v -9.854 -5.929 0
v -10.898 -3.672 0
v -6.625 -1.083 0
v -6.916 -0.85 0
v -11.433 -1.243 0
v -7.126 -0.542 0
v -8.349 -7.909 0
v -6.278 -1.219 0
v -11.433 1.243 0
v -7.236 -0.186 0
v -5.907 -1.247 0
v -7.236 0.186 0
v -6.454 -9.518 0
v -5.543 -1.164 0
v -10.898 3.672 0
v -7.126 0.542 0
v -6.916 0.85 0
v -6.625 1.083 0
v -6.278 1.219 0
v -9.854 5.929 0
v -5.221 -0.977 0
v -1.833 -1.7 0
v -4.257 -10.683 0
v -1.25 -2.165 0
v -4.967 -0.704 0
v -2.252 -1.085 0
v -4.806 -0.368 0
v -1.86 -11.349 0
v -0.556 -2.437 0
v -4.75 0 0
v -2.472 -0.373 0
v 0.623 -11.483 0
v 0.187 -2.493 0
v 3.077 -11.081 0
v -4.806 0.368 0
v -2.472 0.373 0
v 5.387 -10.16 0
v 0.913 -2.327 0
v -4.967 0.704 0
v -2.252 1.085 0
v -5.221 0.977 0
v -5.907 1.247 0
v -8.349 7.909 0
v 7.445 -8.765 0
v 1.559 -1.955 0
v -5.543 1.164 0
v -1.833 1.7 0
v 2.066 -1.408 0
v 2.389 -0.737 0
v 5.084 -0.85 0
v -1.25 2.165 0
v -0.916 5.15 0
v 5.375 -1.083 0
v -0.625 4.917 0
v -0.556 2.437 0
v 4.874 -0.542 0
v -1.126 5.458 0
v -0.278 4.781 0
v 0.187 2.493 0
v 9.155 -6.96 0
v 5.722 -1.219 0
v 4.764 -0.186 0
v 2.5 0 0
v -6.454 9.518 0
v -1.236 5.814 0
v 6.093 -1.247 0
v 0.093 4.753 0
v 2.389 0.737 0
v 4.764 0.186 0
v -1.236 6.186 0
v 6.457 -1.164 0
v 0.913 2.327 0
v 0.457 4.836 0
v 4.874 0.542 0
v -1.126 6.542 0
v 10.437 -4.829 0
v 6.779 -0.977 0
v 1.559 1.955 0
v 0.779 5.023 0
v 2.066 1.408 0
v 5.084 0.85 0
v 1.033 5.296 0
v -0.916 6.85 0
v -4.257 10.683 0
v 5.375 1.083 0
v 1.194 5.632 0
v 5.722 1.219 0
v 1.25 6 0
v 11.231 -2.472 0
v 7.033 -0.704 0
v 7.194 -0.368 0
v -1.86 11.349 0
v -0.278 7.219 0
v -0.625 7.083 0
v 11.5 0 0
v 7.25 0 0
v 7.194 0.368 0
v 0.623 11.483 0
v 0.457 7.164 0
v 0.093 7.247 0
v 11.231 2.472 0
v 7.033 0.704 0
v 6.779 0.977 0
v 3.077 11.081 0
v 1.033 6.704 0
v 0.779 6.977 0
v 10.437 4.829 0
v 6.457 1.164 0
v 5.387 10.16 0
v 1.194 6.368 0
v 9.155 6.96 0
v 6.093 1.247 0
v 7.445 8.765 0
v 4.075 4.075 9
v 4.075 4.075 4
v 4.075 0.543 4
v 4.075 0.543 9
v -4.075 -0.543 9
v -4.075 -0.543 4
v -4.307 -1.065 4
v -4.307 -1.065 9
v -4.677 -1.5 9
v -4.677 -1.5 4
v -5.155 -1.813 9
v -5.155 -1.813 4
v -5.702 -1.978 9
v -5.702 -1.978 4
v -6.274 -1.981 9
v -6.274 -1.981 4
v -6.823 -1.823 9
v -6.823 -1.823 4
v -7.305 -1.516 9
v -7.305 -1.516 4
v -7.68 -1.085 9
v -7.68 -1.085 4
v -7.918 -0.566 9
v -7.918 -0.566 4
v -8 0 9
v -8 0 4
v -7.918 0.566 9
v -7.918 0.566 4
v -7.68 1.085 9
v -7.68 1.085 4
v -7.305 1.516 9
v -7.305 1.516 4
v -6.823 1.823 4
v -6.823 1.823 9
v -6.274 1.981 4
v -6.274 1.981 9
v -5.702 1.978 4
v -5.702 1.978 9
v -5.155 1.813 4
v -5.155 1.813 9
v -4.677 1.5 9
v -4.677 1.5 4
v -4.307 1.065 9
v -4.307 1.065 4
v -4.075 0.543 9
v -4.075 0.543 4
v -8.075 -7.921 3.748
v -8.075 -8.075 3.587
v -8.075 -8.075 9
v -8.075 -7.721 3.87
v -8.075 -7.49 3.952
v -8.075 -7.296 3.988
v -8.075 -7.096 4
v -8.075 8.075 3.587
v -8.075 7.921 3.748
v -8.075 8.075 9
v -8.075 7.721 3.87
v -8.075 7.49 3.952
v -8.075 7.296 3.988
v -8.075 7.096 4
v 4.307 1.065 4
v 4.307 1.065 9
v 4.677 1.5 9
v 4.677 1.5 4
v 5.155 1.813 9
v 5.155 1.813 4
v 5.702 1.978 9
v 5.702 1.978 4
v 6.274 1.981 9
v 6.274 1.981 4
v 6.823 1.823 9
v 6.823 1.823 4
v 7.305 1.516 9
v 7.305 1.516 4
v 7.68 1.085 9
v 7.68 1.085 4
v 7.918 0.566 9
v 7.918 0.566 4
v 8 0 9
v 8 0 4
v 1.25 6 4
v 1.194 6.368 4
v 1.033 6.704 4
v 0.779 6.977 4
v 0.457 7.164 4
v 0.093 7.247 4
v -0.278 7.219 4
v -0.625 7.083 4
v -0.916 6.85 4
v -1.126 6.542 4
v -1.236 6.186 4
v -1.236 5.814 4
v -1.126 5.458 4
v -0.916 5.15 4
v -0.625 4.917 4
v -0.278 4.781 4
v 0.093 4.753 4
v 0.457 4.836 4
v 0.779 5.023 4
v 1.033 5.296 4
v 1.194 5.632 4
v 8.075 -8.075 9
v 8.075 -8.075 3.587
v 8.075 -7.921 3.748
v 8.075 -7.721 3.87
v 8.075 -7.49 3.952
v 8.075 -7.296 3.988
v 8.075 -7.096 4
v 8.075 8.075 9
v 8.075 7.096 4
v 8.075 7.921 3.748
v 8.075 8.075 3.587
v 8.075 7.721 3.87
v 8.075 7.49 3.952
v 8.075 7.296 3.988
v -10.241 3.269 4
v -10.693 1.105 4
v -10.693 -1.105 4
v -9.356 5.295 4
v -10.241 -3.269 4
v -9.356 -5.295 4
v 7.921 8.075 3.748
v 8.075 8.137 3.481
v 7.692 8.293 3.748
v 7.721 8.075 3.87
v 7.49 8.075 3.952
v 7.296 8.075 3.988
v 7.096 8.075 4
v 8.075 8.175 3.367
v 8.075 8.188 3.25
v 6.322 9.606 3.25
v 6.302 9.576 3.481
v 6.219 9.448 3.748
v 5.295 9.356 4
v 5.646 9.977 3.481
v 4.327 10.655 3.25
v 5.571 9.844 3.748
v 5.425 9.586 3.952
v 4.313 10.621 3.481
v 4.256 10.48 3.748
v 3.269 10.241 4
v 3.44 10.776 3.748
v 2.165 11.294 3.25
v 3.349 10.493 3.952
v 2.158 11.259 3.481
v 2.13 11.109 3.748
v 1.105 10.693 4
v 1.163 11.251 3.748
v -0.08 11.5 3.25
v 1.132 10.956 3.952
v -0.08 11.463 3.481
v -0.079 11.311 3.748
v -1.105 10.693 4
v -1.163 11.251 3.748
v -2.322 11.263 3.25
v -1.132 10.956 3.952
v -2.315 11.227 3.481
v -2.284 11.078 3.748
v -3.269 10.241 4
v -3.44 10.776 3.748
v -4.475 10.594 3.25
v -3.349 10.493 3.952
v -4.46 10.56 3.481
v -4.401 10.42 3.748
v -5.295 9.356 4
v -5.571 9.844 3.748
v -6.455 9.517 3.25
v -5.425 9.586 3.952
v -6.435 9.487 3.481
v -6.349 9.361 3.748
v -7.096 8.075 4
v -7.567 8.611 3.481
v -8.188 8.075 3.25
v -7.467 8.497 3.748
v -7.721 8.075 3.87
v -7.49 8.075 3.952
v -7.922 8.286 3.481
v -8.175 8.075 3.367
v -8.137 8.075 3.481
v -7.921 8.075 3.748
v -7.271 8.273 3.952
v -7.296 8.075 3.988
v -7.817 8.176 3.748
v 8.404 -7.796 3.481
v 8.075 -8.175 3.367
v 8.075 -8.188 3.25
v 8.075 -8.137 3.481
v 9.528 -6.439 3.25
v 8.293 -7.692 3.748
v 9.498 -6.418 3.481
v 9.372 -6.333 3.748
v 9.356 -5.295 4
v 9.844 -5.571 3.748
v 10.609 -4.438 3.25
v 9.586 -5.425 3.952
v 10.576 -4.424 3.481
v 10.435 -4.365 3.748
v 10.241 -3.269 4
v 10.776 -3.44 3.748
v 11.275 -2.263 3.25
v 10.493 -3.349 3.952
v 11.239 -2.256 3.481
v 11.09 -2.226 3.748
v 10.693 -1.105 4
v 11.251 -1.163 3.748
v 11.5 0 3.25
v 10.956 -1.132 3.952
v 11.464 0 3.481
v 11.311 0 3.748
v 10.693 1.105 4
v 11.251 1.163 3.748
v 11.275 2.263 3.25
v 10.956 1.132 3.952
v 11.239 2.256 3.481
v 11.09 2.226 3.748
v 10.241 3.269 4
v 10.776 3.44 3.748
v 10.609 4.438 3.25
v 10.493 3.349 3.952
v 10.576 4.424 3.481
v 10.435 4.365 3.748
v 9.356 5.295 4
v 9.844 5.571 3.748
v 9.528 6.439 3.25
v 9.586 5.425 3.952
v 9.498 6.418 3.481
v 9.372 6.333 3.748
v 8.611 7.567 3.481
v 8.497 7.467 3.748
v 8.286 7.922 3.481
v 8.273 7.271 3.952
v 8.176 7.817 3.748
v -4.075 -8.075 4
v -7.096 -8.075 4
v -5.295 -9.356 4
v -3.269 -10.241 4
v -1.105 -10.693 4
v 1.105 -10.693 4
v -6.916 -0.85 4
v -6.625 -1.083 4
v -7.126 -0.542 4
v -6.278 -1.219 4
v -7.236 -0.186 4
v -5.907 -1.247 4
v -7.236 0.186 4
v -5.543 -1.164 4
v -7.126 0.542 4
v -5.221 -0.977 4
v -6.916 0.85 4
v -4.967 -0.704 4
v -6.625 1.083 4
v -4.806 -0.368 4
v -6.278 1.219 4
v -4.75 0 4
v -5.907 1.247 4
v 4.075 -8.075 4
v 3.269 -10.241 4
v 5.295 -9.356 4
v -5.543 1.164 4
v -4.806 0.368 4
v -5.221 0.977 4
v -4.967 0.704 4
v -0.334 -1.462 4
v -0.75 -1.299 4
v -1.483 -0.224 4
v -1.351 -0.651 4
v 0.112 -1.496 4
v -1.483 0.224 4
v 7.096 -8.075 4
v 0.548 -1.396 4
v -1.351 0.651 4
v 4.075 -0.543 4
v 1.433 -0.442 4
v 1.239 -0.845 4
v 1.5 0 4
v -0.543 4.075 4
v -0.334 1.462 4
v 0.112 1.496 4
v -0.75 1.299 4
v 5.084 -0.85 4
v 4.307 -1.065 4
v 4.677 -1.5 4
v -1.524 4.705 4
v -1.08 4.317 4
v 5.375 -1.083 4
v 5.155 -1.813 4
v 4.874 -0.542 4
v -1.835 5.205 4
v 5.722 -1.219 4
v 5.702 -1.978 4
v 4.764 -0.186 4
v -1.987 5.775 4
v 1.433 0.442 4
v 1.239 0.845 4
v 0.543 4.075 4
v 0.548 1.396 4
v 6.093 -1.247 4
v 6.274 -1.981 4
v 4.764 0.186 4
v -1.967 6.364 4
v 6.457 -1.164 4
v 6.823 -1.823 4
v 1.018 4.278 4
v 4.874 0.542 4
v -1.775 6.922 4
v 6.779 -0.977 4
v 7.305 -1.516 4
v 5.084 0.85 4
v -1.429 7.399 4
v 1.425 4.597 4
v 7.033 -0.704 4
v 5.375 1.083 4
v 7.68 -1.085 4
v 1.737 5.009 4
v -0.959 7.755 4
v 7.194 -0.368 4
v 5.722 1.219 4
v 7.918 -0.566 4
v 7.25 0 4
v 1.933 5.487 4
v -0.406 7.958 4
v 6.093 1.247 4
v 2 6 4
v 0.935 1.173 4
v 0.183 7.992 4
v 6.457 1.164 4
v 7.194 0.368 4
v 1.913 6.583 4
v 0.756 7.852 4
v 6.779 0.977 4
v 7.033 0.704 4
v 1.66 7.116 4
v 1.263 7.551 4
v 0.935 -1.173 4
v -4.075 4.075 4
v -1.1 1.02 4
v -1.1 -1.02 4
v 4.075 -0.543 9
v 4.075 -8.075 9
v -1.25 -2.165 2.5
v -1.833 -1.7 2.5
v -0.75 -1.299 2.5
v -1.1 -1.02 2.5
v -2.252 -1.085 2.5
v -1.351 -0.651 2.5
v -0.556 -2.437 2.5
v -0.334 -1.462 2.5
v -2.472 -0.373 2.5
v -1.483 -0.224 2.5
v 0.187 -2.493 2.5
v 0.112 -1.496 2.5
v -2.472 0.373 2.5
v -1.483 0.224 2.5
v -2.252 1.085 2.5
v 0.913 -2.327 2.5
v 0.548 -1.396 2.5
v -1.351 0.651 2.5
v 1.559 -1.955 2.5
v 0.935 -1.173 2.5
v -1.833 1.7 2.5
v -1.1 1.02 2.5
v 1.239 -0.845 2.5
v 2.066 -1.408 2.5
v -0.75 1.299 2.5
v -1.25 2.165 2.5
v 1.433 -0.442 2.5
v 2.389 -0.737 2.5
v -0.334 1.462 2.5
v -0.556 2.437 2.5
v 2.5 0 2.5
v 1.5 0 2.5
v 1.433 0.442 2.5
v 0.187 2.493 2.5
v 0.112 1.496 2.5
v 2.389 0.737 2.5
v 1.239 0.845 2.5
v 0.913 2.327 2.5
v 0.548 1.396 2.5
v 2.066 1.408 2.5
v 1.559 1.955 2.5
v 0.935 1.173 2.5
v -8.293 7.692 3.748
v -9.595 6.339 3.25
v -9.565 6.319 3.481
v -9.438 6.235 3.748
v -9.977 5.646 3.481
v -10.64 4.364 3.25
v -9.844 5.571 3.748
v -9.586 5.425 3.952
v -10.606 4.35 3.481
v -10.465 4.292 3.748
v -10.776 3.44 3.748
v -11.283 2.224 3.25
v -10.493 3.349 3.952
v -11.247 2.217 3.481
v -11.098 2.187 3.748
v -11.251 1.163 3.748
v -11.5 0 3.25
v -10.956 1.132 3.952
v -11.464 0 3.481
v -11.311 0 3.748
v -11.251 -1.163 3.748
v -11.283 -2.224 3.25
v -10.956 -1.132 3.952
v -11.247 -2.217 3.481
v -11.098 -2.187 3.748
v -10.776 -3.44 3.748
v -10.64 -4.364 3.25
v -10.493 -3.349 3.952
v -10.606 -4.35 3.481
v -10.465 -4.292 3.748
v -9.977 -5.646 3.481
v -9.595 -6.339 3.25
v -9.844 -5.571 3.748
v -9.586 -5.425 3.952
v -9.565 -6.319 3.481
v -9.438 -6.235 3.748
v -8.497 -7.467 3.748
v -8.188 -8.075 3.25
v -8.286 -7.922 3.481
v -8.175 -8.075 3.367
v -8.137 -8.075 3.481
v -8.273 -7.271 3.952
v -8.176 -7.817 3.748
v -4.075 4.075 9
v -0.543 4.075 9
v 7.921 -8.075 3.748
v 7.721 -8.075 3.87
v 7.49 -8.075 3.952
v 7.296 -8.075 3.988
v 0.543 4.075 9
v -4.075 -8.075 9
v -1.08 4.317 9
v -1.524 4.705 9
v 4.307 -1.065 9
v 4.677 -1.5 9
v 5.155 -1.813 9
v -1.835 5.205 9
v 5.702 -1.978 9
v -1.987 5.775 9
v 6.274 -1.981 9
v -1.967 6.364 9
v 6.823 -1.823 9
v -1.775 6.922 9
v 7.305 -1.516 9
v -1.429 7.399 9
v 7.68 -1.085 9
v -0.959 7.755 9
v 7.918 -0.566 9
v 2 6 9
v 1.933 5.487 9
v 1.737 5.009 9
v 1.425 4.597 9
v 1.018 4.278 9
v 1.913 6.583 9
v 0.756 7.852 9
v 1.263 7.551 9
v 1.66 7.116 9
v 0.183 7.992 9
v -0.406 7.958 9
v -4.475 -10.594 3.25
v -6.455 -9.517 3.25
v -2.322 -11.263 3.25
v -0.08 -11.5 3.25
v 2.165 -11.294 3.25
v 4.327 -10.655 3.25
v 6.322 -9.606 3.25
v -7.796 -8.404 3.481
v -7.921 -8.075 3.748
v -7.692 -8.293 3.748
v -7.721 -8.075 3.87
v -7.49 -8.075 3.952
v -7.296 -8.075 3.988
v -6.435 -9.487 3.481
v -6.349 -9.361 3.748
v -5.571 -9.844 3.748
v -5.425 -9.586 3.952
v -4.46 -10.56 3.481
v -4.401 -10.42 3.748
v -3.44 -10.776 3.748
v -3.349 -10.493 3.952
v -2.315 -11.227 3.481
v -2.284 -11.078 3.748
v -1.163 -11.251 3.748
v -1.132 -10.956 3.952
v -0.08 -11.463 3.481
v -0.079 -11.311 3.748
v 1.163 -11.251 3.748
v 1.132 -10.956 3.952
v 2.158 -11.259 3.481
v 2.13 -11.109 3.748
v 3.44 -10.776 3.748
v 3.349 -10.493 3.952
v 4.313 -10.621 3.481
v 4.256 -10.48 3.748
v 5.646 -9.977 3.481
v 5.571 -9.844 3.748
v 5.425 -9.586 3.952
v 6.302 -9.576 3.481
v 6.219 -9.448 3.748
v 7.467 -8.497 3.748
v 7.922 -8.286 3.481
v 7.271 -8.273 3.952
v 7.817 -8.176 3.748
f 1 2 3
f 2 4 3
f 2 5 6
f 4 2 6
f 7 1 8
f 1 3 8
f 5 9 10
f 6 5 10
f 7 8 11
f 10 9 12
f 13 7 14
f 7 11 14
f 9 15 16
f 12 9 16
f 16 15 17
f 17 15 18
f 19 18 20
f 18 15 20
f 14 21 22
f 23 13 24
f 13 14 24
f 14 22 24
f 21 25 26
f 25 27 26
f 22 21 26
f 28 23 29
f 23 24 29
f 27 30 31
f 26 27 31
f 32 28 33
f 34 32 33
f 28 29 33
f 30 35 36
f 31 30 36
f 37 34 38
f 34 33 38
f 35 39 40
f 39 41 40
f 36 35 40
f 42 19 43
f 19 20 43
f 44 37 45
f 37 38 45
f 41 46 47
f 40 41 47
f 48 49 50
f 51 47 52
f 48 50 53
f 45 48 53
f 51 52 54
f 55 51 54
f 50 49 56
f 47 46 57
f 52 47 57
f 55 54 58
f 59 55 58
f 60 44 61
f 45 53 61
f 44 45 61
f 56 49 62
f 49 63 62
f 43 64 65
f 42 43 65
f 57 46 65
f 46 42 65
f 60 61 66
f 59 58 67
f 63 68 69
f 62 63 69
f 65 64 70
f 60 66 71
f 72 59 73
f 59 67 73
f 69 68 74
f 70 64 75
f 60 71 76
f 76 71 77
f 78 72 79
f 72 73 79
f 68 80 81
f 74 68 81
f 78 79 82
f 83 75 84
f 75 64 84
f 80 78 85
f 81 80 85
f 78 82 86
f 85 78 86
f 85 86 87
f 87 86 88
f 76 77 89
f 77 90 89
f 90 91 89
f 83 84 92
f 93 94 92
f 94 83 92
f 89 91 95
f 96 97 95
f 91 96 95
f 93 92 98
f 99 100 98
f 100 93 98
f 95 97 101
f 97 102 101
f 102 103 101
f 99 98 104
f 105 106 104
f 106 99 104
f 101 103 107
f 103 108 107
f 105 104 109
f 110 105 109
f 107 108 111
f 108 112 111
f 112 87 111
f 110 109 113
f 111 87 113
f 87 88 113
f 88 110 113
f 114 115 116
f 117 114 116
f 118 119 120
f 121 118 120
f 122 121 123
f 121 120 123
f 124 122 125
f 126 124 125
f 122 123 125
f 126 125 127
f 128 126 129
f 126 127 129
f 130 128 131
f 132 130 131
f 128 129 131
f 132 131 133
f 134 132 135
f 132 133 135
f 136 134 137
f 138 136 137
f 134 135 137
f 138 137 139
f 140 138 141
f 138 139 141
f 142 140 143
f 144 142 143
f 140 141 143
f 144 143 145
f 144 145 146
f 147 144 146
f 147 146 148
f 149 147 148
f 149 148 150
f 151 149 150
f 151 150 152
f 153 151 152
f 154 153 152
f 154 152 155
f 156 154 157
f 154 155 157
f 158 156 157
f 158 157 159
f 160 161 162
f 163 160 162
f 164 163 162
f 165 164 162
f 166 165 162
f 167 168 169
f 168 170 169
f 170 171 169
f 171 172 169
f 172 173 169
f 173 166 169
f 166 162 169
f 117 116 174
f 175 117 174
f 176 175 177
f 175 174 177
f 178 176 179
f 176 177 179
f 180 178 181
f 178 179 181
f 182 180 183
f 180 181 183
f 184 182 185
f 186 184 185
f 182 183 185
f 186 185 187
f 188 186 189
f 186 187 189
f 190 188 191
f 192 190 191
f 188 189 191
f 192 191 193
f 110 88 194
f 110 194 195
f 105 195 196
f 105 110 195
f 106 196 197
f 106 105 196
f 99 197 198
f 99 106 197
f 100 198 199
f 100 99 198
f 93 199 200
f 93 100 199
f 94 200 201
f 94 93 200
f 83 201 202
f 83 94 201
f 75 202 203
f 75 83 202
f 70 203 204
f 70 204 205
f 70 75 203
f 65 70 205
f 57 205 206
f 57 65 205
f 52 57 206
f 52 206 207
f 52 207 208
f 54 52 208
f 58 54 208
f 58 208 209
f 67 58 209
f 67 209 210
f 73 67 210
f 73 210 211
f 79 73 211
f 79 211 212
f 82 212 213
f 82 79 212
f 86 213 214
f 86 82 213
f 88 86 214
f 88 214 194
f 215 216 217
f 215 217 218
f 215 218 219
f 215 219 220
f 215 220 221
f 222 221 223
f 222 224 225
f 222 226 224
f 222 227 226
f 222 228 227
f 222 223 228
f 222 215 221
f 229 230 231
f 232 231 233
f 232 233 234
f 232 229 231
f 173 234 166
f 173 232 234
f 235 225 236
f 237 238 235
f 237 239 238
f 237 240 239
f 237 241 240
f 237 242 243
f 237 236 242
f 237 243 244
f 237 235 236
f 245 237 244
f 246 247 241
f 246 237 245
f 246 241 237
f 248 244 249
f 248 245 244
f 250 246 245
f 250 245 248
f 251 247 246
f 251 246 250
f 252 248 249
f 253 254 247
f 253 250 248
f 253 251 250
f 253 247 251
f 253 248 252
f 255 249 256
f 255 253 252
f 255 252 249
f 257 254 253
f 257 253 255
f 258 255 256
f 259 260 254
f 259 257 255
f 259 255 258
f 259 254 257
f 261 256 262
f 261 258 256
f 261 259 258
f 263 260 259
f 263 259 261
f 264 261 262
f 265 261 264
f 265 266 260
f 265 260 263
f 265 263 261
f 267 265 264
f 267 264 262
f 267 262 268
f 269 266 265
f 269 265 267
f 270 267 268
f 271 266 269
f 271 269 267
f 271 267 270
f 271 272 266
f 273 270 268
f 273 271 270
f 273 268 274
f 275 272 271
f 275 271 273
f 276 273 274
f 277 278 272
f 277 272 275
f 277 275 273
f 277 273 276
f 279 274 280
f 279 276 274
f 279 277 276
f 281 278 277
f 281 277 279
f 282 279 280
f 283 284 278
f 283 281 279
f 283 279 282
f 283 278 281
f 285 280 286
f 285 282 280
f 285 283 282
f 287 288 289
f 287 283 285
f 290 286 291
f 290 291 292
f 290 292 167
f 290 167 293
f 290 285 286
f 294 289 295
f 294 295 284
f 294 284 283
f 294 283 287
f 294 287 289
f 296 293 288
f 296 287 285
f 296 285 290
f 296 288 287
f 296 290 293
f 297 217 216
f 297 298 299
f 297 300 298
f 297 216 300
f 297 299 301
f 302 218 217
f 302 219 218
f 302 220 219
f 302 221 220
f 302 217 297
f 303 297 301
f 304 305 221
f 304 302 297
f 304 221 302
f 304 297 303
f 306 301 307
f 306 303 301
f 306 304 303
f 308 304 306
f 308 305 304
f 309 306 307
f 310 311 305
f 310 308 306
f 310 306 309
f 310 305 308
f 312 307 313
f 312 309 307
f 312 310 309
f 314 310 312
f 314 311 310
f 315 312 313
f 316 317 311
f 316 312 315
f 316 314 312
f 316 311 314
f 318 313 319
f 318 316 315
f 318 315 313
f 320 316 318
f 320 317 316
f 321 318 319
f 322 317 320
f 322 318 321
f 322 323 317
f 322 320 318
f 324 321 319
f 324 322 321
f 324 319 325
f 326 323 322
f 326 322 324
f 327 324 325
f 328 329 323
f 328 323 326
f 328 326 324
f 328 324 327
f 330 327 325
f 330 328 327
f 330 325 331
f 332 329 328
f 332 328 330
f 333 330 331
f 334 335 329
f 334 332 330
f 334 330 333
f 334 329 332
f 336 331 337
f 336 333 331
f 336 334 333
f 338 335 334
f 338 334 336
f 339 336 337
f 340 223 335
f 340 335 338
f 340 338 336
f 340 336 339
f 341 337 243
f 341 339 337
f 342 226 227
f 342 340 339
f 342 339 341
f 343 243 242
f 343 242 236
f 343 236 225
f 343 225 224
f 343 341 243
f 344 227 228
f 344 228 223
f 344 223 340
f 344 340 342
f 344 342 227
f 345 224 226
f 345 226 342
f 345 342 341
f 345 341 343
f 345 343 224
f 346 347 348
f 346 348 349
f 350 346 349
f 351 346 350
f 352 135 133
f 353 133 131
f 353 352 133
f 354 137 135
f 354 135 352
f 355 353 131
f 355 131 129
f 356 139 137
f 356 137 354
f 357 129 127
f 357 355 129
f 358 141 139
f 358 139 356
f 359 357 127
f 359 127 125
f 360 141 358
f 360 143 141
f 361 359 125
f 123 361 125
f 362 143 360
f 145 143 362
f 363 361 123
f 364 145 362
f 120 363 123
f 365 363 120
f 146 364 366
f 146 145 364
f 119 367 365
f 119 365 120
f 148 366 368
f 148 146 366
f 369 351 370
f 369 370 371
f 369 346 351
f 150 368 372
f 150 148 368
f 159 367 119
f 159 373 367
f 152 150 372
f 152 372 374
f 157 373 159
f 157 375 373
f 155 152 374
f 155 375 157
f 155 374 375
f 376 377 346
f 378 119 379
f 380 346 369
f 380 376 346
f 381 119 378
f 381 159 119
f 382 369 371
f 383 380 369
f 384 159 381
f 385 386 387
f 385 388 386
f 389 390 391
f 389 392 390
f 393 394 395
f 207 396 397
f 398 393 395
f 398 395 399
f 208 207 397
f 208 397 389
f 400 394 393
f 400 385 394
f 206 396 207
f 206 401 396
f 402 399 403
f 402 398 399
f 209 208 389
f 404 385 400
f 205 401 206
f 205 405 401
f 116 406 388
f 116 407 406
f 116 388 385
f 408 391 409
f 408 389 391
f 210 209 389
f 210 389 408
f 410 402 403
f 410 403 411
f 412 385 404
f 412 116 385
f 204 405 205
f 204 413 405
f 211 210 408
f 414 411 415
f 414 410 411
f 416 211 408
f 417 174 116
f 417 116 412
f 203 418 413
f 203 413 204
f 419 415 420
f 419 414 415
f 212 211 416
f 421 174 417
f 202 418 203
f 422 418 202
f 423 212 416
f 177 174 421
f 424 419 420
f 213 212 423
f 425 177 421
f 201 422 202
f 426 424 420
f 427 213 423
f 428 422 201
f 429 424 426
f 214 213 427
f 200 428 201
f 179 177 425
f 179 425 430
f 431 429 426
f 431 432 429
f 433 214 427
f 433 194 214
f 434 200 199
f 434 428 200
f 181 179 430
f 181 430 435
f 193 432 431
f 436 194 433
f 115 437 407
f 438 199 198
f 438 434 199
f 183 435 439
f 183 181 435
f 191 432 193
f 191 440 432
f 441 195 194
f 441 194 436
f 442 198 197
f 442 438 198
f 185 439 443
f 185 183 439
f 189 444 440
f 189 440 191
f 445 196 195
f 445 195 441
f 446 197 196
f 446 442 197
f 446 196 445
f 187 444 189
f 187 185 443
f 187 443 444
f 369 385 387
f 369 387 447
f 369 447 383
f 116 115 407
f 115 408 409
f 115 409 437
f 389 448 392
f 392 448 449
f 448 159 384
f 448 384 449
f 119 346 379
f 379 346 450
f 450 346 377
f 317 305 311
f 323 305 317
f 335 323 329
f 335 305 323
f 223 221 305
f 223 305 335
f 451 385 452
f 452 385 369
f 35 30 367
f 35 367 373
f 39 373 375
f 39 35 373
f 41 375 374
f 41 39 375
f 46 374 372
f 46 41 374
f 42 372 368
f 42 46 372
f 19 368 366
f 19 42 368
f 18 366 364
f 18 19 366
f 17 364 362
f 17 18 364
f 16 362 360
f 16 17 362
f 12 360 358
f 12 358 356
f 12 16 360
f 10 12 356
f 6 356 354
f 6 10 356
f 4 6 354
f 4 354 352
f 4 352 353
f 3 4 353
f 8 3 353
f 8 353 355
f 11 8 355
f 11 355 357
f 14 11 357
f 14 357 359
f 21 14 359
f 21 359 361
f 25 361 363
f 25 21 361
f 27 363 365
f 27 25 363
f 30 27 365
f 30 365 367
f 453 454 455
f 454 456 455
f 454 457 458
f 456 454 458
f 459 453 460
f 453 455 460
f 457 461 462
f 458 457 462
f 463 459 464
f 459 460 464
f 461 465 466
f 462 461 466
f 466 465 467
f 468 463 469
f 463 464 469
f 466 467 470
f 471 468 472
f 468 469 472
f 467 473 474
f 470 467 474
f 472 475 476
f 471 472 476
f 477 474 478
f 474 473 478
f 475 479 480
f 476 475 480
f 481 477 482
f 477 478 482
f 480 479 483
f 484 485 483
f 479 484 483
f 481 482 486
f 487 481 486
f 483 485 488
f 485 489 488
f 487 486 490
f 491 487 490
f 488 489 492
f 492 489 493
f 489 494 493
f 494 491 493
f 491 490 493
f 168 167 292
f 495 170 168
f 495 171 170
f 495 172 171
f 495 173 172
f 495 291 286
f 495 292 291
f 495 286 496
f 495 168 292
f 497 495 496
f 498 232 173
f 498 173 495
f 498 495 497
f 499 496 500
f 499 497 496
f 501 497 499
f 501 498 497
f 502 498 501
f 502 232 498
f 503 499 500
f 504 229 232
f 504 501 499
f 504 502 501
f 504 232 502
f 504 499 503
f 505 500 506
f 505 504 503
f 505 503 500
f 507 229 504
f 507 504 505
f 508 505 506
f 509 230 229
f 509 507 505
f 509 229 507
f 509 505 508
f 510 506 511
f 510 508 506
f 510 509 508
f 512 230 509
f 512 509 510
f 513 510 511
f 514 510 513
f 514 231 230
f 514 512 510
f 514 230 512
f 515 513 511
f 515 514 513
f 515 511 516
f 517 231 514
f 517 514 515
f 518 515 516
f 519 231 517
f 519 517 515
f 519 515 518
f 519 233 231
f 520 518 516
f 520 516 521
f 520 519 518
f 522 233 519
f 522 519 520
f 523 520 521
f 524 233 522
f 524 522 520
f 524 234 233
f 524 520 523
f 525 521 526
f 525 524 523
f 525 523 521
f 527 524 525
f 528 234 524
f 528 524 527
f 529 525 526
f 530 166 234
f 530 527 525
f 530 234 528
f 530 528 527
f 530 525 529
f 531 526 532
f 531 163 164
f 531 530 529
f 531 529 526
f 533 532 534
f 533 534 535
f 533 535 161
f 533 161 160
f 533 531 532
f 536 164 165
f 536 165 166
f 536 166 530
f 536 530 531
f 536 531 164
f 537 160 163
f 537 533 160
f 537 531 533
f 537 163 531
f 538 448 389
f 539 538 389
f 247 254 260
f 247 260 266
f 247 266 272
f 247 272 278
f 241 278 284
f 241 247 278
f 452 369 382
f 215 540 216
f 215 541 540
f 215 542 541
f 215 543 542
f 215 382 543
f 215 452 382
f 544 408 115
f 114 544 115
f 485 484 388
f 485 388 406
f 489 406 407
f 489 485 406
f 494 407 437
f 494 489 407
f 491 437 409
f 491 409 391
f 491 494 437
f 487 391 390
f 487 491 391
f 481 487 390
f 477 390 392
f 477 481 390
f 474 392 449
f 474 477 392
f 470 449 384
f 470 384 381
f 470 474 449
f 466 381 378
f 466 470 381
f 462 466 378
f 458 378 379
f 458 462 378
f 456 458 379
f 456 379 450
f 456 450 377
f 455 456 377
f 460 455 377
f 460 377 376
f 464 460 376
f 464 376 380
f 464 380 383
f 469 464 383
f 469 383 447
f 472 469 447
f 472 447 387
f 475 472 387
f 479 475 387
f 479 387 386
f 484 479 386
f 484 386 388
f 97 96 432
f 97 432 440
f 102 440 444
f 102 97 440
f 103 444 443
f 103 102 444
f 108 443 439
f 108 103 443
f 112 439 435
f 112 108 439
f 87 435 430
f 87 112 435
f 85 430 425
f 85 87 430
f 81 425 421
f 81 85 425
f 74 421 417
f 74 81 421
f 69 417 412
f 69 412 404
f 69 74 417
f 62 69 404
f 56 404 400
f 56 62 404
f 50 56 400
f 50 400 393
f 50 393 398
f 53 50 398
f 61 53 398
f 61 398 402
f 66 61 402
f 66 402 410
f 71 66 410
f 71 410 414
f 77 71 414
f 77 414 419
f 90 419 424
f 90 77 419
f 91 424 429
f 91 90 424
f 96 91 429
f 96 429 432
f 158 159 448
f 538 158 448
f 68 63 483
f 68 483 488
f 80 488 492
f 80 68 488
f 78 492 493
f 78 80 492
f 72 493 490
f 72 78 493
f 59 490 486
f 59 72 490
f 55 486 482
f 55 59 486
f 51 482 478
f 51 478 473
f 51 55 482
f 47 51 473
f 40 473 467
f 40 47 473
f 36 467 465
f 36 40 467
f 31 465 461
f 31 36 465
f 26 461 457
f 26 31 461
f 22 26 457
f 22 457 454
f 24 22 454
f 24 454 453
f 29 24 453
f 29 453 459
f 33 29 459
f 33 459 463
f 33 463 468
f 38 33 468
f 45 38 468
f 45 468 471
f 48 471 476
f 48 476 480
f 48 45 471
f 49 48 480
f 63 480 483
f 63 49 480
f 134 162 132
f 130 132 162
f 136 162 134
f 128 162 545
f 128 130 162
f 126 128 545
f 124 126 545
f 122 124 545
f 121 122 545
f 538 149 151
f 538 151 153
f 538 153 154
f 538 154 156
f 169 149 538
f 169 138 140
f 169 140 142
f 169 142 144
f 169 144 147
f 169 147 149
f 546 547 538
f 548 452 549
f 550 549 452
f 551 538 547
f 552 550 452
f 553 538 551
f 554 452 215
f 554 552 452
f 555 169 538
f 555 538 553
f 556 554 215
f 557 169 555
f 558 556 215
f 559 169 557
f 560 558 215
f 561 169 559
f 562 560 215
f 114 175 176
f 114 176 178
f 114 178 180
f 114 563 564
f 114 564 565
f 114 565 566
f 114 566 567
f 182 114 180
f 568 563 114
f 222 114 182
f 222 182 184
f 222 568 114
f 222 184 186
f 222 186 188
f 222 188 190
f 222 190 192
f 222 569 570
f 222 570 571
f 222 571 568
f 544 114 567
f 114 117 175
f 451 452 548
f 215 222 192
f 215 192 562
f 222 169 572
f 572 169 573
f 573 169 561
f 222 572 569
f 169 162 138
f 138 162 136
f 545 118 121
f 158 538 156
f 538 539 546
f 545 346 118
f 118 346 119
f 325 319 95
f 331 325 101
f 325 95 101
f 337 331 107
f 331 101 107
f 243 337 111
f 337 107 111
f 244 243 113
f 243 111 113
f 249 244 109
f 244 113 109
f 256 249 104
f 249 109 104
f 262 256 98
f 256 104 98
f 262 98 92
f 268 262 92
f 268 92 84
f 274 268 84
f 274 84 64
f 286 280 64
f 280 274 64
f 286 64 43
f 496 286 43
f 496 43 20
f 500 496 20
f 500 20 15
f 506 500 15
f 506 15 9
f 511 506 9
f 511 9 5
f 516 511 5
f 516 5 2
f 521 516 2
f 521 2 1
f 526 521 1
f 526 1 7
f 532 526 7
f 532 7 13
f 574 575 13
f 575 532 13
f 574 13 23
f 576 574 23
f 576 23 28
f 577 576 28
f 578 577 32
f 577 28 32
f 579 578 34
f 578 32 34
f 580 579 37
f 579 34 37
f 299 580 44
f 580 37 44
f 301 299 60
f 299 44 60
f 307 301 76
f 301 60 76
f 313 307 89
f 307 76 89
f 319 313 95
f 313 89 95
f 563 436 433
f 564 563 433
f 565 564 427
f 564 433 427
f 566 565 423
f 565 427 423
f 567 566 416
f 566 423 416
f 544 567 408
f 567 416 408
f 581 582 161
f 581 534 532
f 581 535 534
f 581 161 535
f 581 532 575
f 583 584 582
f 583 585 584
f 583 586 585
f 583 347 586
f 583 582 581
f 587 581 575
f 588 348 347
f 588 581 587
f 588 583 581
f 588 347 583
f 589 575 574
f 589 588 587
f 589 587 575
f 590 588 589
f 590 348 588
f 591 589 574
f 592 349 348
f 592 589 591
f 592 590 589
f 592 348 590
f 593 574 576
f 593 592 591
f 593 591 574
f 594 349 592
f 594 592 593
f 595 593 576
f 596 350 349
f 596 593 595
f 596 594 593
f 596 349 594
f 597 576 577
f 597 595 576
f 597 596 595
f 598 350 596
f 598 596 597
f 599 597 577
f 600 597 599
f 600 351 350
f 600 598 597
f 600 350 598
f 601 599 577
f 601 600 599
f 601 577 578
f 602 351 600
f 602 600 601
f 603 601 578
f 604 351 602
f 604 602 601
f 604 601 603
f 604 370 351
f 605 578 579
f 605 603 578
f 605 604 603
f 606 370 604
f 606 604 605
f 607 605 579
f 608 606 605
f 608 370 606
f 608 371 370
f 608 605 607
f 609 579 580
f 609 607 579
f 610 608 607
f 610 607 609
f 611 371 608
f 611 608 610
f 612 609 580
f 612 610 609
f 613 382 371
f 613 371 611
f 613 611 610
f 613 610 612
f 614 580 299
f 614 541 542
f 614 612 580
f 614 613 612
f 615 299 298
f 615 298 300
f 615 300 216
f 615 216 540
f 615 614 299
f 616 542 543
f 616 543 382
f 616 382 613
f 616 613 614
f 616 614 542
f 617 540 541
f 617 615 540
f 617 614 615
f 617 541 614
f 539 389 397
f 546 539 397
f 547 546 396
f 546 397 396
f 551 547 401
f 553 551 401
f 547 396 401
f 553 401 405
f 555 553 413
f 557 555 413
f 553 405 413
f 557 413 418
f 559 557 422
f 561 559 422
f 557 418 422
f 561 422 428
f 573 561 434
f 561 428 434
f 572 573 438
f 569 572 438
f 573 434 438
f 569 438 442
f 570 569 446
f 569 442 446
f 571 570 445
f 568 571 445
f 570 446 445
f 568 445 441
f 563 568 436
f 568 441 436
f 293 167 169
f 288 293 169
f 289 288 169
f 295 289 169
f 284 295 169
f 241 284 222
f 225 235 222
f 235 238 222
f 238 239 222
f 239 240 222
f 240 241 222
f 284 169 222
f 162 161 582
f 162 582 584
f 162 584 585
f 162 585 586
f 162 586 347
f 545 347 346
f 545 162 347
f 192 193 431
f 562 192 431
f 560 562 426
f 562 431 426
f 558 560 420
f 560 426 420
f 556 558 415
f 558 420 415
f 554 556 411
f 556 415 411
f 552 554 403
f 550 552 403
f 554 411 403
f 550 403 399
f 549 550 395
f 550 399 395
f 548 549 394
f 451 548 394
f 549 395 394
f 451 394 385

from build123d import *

# Parameters (mm, degrees)
F0_R     = 11.5
F0_R_2   = 1.25
F0_R_3   = 1.5
F1_DEPTH = 4
F3_DEPTH = 5
F5_R     = 2.5
F5_R_2   = 1.5
F6_DEPTH = 2.5


# Not quite as in the source:
# - a fillet or chamfer that OpenCascade refuses, or shapes differently, is made with other operations: its cross-section is extruded or revolved along the edge and cut away or added
# - a feature names something its author has since deleted; it is built from what else it names


with BuildPart() as f1:
    # F0 (on Top) → F1 (new body)
    with BuildSketch(Plane.XY):
        Circle(F0_R)
        with Locations((-6, 0)):
            Circle(F0_R_2, mode=Mode.SUBTRACT)
        Circle(F0_R_3, mode=Mode.SUBTRACT)
        with Locations((6, 0)):
            Circle(F0_R_2, mode=Mode.SUBTRACT)
        with Locations((0, 6)):
            Circle(F0_R_2, mode=Mode.SUBTRACT)
    extrude(amount=F1_DEPTH)

    # F2 (on face) → F3 (join)
    with BuildSketch(Plane.XY.offset(4)):
        with BuildLine():
            Line((0.5425633604, 4.075), (4.075, 4.075))
            Line((4.075, 4.075), (4.075, 0.5425633604))
            ThreePointArc((4.075, 0.5425633604), (6.2738612788, 1.9811612756), (8, 0))
            ThreePointArc((8, 0), (6.2738612788, -1.9811612756), (4.075, -0.5425633604))
            Line((4.075, -0.5425633604), (4.075, -4.075))
            Line((4.075, -4.075), (4.075, -8.075))
            Line((4.075, -8.075), (8.075, -8.075))
            Line((8.075, -8.075), (8.075, 8.075))
            Line((8.075, 8.075), (-8.075, 8.075))
            Line((-8.075, 8.075), (-8.075, -8.075))
            Line((-8.075, -8.075), (-4.075, -8.075))
            Line((-4.075, -8.075), (-4.075, -4.075))
            Line((-4.075, -4.075), (-4.075, -0.5425633604))
            ThreePointArc((-4.075, -0.5425633604), (-8, 0), (-4.075, 0.5425633604))
            Line((-4.075, 0.5425633604), (-4.075, 4.075))
            Line((-4.075, 4.075), (-0.5425633604, 4.075))
            ThreePointArc((-0.5425633604, 4.075), (-1.2072434053, 7.5945417399), (2, 6))
            ThreePointArc((2, 6), (1.5945417399, 4.7927565947), (0.5425633604, 4.075))
        make_face()
    extrude(amount=F3_DEPTH)

    # F4: fillet of radius 0.75 on 1 edges, made by hand


with BuildPart() as f4_tool2:
    # F4_s3 → F4_t4 (revolve)
    with BuildSketch(Plane.XZ):
        with BuildLine():
            ThreePointArc((11.5, 3.25), (11.2803300859, 3.7803300859), (10.75, 4))
            Line((10.75, 4), (11.5, 4))
            Line((11.5, 4), (11.5, 3.25))
        make_face()
    revolve(axis=Axis((0, 0, 4), (0, 0, 1)))

    split(bisect_by=Plane.YZ.offset(8.075), keep=Keep.TOP)


with BuildPart() as f1_1:
    add(f1.part)

    # F4_t1: cut F4_tool2
    add(f4_tool2.part, mode=Mode.SUBTRACT)


with BuildPart() as f4_tool7:
    # F4_s8 → F4_t9 (revolve)
    with BuildSketch(Plane.XZ):
        with BuildLine():
            ThreePointArc((11.5, 3.25), (11.2803300859, 3.7803300859), (10.75, 4))
            Line((10.75, 4), (11.5, 4))
            Line((11.5, 4), (11.5, 3.25))
        make_face()
    revolve(axis=Axis((0, 0, 4), (0, 0, 1)))

    split(bisect_by=Plane.XZ.offset(-8.075), keep=Keep.BOTTOM)


with BuildPart() as f1_2:
    add(f1_1.part)

    # F4_t6: cut F4_tool7
    add(f4_tool7.part, mode=Mode.SUBTRACT)


with BuildPart() as f4_tool12:
    # F4_s13 → F4_t14 (revolve)
    with BuildSketch(Plane.XZ):
        with BuildLine():
            ThreePointArc((11.5, 3.25), (11.2803300859, 3.7803300859), (10.75, 4))
            Line((10.75, 4), (11.5, 4))
            Line((11.5, 4), (11.5, 3.25))
        make_face()
    revolve(axis=Axis((0, 0, 4), (0, 0, 1)))

    split(bisect_by=Plane.XZ.offset(8.075), keep=Keep.TOP)


with BuildPart() as f1_3:
    add(f1_2.part)

    # F4_t11: cut F4_tool12
    add(f4_tool12.part, mode=Mode.SUBTRACT)


with BuildPart() as f4_tool17:
    # F4_s18 → F4_t19 (revolve)
    with BuildSketch(Plane.XZ):
        with BuildLine():
            ThreePointArc((11.5, 3.25), (11.2803300859, 3.7803300859), (10.75, 4))
            Line((10.75, 4), (11.5, 4))
            Line((11.5, 4), (11.5, 3.25))
        make_face()
    revolve(axis=Axis((0, 0, 4), (0, 0, 1)))

    split(bisect_by=Plane.YZ.offset(-8.075), keep=Keep.BOTTOM)


with BuildPart() as f1_4:
    add(f1_3.part)

    # F4_t16: cut F4_tool17
    add(f4_tool17.part, mode=Mode.SUBTRACT)

    # F5 (on face) → F6 (cut)
    with BuildSketch(Plane.XY):
        Circle(F5_R)
        Circle(F5_R_2, mode=Mode.SUBTRACT)
    extrude(amount=F6_DEPTH, mode=Mode.SUBTRACT)


solid = f1_4.part
